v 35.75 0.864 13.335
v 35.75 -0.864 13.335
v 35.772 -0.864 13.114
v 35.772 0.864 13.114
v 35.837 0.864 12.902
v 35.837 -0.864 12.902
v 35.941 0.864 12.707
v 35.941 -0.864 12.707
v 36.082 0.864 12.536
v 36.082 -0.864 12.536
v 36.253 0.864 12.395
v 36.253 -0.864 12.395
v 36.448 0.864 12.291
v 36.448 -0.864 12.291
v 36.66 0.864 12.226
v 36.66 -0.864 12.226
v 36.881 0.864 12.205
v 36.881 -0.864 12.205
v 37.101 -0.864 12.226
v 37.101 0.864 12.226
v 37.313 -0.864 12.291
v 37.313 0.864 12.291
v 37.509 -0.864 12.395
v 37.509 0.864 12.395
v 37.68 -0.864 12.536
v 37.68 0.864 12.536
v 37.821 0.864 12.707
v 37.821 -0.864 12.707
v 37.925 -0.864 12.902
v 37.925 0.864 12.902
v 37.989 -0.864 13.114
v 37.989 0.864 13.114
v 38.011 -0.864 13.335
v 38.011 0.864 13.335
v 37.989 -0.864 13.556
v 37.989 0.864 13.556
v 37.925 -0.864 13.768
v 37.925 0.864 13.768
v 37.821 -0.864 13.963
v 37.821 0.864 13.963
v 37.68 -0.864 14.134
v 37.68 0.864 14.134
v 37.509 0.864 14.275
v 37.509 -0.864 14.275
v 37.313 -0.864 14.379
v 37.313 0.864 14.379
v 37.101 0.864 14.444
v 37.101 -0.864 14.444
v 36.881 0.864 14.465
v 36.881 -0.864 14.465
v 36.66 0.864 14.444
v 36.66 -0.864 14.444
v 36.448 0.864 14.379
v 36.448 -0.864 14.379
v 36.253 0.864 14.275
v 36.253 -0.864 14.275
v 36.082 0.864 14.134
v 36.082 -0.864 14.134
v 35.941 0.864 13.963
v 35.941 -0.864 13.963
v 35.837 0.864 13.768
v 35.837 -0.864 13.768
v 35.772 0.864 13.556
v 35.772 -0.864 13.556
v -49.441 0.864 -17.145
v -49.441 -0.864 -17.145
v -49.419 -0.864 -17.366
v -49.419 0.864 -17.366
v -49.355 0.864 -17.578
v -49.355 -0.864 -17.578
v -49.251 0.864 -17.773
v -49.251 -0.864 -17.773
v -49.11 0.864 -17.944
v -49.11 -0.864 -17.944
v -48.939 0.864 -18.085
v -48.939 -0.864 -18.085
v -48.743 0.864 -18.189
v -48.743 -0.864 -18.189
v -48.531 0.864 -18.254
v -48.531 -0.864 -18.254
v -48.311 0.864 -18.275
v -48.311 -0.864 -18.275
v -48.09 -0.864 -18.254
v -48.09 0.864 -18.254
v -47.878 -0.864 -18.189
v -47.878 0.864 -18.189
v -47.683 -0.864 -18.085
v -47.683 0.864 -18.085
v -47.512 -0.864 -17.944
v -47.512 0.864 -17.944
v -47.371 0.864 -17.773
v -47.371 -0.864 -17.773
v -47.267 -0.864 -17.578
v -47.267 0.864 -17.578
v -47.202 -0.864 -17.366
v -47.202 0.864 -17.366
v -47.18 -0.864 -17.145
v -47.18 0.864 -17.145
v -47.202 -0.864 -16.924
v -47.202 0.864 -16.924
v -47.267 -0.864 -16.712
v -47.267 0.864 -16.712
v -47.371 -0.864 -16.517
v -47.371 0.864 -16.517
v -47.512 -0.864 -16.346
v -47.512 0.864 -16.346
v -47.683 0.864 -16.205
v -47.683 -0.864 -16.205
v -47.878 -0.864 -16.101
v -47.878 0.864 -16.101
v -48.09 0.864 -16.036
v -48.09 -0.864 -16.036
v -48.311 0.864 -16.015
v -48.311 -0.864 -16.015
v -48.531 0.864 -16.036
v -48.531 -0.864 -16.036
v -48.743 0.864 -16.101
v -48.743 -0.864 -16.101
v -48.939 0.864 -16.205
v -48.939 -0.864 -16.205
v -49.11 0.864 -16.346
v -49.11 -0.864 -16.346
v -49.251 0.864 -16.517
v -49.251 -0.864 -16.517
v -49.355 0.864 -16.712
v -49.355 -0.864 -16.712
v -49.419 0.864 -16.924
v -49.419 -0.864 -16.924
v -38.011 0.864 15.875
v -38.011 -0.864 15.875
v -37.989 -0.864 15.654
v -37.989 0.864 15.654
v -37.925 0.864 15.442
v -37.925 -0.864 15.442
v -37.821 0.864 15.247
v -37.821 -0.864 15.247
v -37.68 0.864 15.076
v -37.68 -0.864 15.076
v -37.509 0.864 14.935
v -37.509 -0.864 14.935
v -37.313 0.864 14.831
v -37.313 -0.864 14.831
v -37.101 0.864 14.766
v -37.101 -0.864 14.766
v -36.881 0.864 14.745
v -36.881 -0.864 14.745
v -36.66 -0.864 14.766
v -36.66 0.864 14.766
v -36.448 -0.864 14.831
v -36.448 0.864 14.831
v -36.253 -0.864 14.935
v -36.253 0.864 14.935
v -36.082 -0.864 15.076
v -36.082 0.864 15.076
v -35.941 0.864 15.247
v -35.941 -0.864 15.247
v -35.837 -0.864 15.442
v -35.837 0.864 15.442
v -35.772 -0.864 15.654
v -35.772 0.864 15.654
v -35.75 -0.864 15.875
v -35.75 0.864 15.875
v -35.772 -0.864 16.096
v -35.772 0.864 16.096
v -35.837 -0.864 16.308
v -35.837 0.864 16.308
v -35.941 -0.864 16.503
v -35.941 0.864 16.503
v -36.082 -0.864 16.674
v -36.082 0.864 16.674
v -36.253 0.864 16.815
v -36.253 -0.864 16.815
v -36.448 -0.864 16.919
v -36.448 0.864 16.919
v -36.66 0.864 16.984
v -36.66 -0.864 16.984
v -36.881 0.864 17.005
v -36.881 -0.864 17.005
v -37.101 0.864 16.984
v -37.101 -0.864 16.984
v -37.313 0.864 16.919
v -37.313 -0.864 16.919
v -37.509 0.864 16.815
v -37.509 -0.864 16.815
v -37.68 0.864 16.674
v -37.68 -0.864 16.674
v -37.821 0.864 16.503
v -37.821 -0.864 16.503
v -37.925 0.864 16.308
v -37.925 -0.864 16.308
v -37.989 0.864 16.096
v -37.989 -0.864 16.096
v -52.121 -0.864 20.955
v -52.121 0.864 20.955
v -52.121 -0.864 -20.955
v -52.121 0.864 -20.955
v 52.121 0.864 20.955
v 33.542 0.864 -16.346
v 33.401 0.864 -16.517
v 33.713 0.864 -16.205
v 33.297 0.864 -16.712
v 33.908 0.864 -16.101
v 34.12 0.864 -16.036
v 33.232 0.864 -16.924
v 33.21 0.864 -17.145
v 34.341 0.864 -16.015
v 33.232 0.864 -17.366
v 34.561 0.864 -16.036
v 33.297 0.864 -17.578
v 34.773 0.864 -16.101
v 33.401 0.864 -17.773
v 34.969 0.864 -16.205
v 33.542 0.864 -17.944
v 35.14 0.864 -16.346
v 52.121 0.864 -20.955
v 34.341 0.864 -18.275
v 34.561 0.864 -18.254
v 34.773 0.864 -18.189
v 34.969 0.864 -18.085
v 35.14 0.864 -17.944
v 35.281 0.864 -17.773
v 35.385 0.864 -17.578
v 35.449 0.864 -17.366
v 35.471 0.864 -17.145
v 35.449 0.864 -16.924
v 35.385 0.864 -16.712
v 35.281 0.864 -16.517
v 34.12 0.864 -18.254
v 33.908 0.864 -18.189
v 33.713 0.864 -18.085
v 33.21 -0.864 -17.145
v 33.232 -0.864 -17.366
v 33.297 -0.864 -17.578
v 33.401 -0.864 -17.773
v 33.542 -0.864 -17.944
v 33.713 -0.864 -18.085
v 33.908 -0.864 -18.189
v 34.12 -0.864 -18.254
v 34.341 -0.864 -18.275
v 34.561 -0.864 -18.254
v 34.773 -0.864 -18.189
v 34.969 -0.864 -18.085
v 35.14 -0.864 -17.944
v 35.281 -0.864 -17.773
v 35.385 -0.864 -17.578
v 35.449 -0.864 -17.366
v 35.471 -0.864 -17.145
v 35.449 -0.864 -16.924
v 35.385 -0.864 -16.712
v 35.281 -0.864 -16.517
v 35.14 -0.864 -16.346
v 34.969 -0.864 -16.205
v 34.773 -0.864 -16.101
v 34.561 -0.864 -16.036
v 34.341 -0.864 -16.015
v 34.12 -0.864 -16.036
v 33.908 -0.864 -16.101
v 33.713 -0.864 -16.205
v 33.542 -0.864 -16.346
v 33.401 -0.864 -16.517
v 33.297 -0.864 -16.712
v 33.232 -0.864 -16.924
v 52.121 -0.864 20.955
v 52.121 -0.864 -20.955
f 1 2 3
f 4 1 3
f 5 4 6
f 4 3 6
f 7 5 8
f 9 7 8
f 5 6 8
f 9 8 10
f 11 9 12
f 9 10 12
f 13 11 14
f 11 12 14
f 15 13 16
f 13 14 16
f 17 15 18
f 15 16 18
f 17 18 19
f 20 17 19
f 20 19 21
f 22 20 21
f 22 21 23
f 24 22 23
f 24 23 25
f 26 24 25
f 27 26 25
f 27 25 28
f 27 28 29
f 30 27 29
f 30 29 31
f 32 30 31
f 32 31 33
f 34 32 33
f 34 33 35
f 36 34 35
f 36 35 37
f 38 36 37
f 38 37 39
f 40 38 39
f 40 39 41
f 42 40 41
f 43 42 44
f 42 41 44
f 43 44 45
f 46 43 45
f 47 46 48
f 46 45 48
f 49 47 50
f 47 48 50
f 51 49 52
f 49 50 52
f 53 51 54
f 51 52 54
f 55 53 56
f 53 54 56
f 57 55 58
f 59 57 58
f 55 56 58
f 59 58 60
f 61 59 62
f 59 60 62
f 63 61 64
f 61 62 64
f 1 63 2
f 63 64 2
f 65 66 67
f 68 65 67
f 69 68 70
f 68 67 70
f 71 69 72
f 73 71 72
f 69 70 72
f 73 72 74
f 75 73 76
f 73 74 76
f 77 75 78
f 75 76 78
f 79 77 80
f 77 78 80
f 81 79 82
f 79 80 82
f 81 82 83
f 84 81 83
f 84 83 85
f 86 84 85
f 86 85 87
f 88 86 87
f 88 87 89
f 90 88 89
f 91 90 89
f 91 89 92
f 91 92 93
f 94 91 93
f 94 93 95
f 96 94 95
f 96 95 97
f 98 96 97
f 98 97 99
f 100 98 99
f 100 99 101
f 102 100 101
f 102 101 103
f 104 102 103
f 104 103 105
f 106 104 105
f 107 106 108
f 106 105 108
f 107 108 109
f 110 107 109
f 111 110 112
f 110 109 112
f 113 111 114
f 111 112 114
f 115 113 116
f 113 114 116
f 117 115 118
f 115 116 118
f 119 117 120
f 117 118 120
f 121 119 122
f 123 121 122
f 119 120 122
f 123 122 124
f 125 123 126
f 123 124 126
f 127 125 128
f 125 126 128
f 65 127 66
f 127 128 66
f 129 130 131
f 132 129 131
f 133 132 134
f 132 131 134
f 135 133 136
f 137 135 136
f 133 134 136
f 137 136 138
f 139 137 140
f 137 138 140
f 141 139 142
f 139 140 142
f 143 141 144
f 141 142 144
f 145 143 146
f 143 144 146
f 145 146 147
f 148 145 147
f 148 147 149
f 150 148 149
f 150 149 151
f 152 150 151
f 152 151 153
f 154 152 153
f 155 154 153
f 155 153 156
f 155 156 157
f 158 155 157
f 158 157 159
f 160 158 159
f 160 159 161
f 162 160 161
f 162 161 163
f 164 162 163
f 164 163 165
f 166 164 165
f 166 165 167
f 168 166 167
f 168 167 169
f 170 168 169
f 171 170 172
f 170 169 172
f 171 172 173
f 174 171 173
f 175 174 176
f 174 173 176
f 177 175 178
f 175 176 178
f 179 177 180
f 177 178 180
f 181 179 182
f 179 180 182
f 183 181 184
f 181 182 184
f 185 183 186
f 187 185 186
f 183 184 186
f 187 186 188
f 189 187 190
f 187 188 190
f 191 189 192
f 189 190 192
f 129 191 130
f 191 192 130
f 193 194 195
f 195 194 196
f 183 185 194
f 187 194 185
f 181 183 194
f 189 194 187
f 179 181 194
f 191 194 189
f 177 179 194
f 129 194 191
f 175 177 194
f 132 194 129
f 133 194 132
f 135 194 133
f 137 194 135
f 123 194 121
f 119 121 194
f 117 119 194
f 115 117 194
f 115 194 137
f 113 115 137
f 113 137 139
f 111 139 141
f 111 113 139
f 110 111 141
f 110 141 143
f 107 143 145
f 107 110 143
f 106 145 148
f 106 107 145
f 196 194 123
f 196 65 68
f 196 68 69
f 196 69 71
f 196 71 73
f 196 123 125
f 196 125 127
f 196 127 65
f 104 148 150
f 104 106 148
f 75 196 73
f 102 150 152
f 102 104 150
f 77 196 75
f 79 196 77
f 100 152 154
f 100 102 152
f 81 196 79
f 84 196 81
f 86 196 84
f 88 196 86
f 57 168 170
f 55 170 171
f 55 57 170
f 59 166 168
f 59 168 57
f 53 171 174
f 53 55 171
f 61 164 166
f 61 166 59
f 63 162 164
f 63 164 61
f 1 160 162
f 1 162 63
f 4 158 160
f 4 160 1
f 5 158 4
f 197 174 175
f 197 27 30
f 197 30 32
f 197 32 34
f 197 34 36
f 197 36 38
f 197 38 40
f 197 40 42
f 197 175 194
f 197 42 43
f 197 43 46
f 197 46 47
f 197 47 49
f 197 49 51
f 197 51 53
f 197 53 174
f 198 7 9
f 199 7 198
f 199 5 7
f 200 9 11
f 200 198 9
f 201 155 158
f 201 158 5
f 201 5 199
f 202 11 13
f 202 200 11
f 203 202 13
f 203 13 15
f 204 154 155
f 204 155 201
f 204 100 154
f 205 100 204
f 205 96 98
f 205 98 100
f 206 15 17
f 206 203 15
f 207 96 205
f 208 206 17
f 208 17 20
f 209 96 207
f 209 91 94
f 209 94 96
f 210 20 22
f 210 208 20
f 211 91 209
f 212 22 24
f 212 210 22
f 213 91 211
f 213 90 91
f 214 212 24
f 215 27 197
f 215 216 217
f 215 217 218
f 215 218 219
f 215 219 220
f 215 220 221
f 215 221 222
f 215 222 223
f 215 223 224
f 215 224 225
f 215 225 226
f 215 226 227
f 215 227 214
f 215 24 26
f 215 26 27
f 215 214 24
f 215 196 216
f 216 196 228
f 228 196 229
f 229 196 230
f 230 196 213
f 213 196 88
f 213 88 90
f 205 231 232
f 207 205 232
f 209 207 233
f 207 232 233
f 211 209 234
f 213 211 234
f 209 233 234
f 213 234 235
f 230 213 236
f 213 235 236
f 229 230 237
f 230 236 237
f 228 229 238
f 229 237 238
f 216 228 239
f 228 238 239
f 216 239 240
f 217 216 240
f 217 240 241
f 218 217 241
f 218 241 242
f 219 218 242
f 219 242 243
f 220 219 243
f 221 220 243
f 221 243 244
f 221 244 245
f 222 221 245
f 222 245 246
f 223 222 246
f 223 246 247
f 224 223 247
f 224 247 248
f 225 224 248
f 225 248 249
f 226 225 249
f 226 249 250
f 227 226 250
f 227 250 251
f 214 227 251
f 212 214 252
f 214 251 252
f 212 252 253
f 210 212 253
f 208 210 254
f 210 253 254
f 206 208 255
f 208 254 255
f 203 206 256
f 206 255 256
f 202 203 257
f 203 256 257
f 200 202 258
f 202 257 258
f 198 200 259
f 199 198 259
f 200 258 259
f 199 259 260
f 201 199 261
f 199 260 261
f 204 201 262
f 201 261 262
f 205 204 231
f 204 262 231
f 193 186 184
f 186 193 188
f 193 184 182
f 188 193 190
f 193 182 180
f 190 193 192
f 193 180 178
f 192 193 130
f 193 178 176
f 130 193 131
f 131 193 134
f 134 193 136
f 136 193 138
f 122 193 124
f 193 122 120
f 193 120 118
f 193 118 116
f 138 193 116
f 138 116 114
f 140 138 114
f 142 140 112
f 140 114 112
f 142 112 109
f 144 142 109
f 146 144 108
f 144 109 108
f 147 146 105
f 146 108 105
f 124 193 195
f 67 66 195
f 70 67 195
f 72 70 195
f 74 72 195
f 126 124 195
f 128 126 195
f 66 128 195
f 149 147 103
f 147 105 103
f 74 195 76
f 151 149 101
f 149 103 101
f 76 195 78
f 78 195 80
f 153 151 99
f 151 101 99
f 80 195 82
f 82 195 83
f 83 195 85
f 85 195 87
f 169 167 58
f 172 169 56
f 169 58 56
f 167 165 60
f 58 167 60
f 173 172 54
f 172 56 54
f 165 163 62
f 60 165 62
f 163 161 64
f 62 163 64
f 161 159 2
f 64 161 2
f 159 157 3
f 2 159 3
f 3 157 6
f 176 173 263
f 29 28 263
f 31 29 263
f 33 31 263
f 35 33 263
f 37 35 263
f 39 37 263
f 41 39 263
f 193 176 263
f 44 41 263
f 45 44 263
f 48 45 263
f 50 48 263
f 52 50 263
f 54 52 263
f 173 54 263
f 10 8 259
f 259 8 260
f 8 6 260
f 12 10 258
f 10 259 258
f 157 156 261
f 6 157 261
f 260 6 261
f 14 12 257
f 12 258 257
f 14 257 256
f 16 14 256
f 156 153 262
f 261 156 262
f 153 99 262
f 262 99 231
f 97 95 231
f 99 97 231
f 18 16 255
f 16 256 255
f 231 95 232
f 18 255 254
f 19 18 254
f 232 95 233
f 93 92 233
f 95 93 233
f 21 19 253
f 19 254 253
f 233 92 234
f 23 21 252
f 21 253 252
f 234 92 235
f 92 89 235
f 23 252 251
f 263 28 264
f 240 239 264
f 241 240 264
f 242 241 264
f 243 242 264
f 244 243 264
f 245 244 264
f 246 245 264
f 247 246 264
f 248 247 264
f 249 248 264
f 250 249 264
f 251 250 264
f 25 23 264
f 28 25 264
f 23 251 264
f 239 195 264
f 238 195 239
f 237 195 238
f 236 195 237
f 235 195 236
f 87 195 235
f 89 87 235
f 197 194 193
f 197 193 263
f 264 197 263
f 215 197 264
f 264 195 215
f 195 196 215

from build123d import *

# Parameters (mm, degrees)
SKETCH1_W             = 104.2416
SKETCH1_H             = 41.91
BOSS_EXTRUDE1_DEPTH   = 0.8636
F_4_40_TAPPED_HOLE1_D = 2.2606


with BuildPart() as part:
    # Sketch1 → Boss-Extrude1 (new, symmetric)
    with BuildSketch(Plane(origin=(0, 0, 0), x_dir=(1, 0, 0), z_dir=(0, 1, 0))):
        Rectangle(SKETCH1_W, SKETCH1_H)
    extrude(amount=BOSS_EXTRUDE1_DEPTH, both=True)

    # #4-40 Tapped Hole1 (through all)
    with Locations(Plane(origin=(0, 0.8636, 0), x_dir=(1, 0, 0), z_dir=(0, 1, 0))):
        with Locations((-48.3108, 17.145), (-36.8808, -15.875), (34.3408, 17.145), (36.8808, -13.335)):
            Hole(F_4_40_TAPPED_HOLE1_D / 2)


solid = part.part
